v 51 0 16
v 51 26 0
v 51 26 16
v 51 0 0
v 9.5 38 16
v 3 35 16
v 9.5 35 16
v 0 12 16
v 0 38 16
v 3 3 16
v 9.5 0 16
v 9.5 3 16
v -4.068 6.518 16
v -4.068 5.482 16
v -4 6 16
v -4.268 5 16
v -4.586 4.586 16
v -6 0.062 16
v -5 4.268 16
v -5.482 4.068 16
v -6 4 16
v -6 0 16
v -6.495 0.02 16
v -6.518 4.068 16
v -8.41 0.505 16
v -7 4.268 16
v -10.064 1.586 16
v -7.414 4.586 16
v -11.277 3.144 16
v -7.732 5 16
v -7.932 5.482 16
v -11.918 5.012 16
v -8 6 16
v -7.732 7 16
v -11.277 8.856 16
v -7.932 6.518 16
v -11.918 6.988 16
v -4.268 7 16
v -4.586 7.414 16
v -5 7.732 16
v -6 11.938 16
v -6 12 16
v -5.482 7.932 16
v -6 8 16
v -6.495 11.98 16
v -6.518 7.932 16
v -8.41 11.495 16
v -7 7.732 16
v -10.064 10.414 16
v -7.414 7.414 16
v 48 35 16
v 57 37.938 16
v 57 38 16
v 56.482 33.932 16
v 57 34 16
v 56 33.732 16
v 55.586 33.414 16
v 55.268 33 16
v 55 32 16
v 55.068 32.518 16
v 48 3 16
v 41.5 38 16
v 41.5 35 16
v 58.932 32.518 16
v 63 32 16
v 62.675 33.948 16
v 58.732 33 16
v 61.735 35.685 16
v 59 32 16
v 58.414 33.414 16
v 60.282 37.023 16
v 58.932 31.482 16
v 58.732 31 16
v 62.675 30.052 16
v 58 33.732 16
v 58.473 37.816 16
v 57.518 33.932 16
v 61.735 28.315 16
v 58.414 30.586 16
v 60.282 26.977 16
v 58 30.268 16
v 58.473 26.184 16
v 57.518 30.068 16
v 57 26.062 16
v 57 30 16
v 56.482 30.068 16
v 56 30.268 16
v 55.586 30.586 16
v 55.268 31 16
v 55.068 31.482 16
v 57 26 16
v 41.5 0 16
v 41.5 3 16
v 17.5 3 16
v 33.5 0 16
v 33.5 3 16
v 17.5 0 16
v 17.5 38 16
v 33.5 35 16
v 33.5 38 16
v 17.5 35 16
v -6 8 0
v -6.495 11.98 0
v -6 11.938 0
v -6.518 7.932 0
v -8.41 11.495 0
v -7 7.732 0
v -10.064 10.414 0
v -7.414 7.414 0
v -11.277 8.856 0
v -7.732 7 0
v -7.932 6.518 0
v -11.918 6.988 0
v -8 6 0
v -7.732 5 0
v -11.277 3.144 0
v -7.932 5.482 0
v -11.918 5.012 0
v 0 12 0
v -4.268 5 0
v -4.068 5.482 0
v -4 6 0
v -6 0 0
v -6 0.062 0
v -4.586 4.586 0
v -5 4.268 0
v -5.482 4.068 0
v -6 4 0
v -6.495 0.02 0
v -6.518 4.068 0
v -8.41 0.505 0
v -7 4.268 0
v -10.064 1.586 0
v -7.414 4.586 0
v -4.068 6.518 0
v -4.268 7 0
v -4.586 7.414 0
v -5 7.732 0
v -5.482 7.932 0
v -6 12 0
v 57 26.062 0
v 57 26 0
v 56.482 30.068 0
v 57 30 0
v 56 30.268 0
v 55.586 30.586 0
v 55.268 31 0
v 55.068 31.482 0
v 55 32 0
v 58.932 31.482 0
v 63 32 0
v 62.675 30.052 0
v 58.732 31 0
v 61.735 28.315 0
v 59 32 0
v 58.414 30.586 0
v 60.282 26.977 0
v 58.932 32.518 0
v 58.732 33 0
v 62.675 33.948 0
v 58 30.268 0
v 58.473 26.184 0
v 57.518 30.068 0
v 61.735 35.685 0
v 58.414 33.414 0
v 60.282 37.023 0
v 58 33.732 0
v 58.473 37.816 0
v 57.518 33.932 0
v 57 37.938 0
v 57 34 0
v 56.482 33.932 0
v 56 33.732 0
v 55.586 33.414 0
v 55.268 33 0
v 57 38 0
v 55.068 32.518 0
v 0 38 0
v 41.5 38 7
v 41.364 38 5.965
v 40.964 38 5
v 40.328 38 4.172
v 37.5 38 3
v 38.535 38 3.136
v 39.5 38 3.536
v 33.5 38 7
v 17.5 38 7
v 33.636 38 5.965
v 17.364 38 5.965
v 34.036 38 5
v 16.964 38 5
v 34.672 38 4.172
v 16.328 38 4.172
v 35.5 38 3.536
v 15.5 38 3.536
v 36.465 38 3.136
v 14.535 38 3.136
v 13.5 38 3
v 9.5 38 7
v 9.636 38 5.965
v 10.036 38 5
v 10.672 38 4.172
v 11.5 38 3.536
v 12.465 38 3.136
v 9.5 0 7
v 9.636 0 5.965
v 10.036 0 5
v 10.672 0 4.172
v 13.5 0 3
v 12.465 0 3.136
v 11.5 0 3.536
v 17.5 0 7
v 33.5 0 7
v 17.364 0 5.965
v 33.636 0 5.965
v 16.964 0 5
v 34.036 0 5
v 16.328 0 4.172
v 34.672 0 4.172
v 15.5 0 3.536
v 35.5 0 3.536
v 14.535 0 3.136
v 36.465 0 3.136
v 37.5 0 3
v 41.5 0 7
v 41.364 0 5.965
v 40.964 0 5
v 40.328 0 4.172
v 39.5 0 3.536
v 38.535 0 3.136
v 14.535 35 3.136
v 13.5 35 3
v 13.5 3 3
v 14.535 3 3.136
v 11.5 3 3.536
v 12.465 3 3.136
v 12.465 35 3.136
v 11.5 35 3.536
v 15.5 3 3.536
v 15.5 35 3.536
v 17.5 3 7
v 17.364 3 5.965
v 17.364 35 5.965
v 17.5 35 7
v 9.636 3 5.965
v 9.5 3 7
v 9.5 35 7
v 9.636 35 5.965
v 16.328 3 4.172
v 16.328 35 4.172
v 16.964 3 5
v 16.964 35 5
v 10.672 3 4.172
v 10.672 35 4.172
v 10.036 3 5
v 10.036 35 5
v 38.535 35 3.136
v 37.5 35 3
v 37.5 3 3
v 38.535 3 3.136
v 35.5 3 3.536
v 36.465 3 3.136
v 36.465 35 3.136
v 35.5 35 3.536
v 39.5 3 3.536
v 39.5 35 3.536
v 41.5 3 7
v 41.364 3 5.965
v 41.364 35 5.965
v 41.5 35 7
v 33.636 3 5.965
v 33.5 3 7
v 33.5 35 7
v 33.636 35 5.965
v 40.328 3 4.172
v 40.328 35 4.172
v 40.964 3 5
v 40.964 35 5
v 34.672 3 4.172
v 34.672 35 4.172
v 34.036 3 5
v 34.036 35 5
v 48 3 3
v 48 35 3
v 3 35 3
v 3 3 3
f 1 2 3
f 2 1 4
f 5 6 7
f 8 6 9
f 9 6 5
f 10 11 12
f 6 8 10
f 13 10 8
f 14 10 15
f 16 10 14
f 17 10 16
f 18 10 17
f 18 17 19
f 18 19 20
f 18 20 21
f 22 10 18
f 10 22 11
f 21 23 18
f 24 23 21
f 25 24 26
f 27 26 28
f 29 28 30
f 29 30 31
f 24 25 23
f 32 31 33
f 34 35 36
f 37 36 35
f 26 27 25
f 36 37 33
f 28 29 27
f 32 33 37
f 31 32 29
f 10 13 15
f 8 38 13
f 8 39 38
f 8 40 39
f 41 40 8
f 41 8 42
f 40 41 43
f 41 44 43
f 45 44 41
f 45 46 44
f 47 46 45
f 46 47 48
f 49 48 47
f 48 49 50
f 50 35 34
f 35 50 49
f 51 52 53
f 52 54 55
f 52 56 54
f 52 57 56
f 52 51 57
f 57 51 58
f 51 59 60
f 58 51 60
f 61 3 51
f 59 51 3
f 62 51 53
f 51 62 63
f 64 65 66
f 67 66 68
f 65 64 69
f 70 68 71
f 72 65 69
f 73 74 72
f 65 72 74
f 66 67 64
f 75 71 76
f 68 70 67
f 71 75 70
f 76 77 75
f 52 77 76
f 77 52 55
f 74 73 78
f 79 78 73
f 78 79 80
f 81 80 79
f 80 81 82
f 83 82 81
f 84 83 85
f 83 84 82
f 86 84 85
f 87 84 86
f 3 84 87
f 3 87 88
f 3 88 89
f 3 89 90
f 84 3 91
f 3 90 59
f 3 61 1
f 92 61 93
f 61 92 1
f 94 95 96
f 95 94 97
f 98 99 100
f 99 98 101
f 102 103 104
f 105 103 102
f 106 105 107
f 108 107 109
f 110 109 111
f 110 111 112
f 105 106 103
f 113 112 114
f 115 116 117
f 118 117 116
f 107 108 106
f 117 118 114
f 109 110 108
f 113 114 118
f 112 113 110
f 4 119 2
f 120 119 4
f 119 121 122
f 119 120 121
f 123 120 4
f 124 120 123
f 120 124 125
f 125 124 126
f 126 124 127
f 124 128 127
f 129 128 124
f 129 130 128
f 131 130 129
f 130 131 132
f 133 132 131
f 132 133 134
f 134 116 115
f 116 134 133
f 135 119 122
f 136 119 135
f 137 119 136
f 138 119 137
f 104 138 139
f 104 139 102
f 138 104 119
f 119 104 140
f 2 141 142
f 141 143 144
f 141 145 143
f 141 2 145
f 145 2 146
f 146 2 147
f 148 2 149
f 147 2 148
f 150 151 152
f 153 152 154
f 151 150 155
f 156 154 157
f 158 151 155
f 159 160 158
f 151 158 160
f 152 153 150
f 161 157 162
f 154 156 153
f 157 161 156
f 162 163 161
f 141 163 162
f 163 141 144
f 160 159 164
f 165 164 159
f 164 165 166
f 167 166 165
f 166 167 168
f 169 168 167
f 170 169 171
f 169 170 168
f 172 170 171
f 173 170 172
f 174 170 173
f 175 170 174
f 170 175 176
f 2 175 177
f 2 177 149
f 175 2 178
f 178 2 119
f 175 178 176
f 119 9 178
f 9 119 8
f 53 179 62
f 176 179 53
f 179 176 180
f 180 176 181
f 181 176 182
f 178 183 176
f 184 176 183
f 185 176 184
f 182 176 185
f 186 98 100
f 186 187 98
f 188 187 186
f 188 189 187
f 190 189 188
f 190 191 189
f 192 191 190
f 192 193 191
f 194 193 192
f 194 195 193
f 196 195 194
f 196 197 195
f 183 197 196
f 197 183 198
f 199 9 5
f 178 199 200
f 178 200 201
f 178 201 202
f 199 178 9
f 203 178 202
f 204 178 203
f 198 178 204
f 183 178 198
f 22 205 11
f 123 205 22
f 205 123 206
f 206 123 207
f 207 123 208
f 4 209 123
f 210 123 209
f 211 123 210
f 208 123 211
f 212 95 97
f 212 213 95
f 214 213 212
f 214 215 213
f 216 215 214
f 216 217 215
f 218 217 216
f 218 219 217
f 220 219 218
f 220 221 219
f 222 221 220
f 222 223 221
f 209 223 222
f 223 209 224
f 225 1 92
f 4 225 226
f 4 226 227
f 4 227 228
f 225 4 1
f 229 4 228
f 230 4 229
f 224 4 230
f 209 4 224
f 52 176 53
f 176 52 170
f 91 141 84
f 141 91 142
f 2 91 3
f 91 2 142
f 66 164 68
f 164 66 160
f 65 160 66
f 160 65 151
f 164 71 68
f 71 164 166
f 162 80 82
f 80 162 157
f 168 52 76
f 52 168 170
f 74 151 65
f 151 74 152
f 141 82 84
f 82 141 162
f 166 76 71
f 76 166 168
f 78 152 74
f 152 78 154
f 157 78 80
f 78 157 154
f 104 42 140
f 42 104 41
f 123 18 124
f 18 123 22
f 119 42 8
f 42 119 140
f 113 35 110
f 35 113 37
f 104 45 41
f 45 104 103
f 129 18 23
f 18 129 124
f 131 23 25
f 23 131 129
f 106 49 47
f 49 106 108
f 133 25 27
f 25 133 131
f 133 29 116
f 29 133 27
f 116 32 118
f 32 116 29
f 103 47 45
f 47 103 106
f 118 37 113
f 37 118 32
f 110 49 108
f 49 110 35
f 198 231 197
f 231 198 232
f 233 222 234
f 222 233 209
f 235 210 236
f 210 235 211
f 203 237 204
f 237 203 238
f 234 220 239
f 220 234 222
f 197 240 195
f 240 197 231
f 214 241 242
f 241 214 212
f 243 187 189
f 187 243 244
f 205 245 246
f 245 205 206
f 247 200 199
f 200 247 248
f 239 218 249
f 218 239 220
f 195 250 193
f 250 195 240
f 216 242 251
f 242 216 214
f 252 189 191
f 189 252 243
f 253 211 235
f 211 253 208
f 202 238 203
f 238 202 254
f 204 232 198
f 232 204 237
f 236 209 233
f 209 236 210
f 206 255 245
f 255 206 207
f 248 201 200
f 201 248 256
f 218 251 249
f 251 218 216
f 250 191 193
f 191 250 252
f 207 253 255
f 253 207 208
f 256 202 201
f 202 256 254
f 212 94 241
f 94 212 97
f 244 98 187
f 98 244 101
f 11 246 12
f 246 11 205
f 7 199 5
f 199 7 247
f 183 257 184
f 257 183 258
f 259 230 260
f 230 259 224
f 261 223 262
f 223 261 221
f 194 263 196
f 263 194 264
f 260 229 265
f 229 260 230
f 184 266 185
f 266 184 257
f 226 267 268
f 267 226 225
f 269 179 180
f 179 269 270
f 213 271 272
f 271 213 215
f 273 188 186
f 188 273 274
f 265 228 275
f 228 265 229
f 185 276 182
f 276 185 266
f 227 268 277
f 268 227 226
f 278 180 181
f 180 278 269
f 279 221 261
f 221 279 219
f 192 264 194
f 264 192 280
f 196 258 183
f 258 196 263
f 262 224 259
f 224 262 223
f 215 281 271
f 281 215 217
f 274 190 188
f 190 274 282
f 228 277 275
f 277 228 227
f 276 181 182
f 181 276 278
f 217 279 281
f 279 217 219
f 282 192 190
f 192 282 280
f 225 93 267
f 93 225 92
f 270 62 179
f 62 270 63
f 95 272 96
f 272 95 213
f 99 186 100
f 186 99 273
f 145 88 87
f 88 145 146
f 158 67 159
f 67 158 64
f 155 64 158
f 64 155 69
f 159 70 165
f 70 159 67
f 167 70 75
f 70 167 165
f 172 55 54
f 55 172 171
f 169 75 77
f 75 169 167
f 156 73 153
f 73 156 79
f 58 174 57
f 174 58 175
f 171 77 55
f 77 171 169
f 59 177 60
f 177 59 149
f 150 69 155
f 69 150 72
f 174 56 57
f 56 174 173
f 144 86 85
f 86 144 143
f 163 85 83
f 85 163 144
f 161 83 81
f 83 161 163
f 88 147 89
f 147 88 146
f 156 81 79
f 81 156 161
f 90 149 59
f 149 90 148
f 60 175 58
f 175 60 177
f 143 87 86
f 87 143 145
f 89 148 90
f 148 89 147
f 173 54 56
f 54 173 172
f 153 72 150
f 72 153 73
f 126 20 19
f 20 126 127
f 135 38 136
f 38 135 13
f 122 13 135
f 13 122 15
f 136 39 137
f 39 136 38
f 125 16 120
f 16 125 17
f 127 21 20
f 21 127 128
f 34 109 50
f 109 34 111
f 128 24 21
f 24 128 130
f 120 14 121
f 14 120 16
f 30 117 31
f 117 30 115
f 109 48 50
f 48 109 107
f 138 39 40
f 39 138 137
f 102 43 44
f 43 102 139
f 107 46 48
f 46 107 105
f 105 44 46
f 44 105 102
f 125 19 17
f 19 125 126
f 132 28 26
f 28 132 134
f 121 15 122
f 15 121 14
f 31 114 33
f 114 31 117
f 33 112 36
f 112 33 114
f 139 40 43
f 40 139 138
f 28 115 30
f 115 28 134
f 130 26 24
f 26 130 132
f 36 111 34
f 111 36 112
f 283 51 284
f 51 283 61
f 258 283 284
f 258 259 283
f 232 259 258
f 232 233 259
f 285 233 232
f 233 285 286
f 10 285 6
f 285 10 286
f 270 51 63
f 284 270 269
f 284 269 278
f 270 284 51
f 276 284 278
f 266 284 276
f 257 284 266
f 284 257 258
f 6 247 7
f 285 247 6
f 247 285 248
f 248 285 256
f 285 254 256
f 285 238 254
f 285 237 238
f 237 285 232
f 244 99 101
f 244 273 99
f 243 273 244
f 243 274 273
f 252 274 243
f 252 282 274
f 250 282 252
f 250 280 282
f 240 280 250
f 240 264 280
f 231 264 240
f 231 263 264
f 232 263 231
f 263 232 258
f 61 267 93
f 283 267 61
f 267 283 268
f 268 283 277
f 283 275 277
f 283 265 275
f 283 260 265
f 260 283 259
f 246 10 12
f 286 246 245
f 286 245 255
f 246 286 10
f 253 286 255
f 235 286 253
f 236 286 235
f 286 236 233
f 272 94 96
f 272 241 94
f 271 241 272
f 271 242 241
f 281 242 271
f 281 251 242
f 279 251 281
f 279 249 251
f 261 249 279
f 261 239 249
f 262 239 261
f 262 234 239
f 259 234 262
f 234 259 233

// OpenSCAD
// number of relay insets
relays = 2;

// dimensions of relay body
relay_x = 21;
relay_y = 32;
relay_z = 19;

// inset of terminals from body end, edge to center
terminal_offset = 7.5;

// thickness of side, top, divider walls
wall_thickness = 3;

// cover height
cover_height = 16;

// terminal holes
// set to "rect" and set x,y, or set to "round" and set diameter d
// logic checks for "rect" and sets to round for anything else
// ignores irrelevant value set
bottom_hole = "round";
bottom_hole_x = 12;
bottom_hole_y = 9;
bottom_hole_d = 12;

top_hole = "rect";
top_hole_x = 12;
top_hole_y = 9;
top_hole_d = 12;

// mounting tabs width
mounting_tab_width = 12;
// screw hole diameters
mounting_screw_diameter = 4;
cover_screw_diameter = 3;

// uncomment the part you want to render
//baseplate();
//holder();
cover();

overall_x = relays * relay_x + wall_thickness*(relays+1);
overall_y = relay_y+2*wall_thickness;
overall_z = relay_z+wall_thickness;

module cover() {
rotate([0,0,0]) {
    difference() {
    union() {
        // main body
        cube([overall_x,overall_y,cover_height]);
        
        //cover tabs
        translate([overall_x-mounting_tab_width/2,overall_y-mounting_tab_width,0])
        cube([mounting_tab_width,mounting_tab_width,cover_height]);
        translate([overall_x+mounting_tab_width/2,overall_y-mounting_tab_width/2,0])
        cylinder(d=mounting_tab_width,h=cover_height);
        
        translate([-mounting_tab_width/2,0,0])
        cube([mounting_tab_width,mounting_tab_width,cover_height]);
        translate([-mounting_tab_width/2,mounting_tab_width/2,0])
        cylinder(d=mounting_tab_width,h=cover_height);
    }
    
    // cover holes
    // bumped out 1mm in diameter to accommodate top of screw
    translate([overall_x+mounting_tab_width/2,overall_y-mounting_tab_width/2,-1])
    cylinder(d=cover_screw_diameter+1,h=cover_height+2,$fn=24);
    translate([-mounting_tab_width/2,mounting_tab_width/2,-1])
    cylinder(d=cover_screw_diameter+1,h=cover_height+2,$fn=24);
    
    
    // main cavity
    translate([wall_thickness,wall_thickness,wall_thickness])
    cube([overall_x-2*wall_thickness,overall_y-2*wall_thickness,cover_height]);
    
    //wire pass-throughs
    for (i=[0:1:relays-1]) {
        // calculate offsets
        x_offset = i*(relay_x+wall_thickness)+wall_thickness;
        centerline = x_offset+relay_x/2;
        
        translate([centerline,overall_y+1,wall_thickness+4])
        rotate([90,0,0])
        cylinder(d=8,h=overall_y+2,$fn=24);
        
        translate([centerline-4,-1,wall_thickness+4])
        cube([8,overall_y+2,cover_height]);
        
        
        
    }
    
}
}
}



module holder() {
rotate([180,0,0]) {
    difference() {
    union() {
        // main body
        cube([overall_x,overall_y,overall_z]);
        // mounting tabs
        translate([-mounting_tab_width/2,0,0])
        cube([mounting_tab_width,mounting_tab_width,overall_z]);
        translate([-mounting_tab_width/2,mounting_tab_width/2,0])
        cylinder(d=mounting_tab_width,h=overall_z);
        translate([overall_x-mounting_tab_width/2,overall_y-mounting_tab_width,0])
        cube([mounting_tab_width,mounting_tab_width,overall_z]);
        translate([overall_x+mounting_tab_width/2,overall_y-mounting_tab_width/2,0])
        cylinder(d=mounting_tab_width,h=overall_z);
        
        //cover tabs
        translate([overall_x-mounting_tab_width/2,0,overall_z-10])
        cube([mounting_tab_width,mounting_tab_width,10]);
        translate([overall_x+mounting_tab_width/2,mounting_tab_width/2,overall_z-10])
        cylinder(d=mounting_tab_width,h=10);
        translate([-mounting_tab_width/2,overall_y-mounting_tab_width,overall_z-10])
        cube([mounting_tab_width,mounting_tab_width,10]);
        translate([-mounting_tab_width/2,overall_y-mounting_tab_width/2,overall_z-10])
        cylinder(d=mounting_tab_width,h=10);
    }
    //mounting holes
    translate([-mounting_tab_width/2,mounting_tab_width/2,-1])
    cylinder(d=mounting_screw_diameter,h=overall_z+2,$fn=24);
    translate([overall_x+mounting_tab_width/2,overall_y-mounting_tab_width/2,-1])
    cylinder(d=mounting_screw_diameter,h=overall_z+2,$fn=24);
    
    // cover holes
    translate([overall_x+mounting_tab_width/2,mounting_tab_width/2,-1])
    cylinder(d=cover_screw_diameter,h=overall_z+2,$fn=24);
    translate([-mounting_tab_width/2,overall_y-mounting_tab_width/2,-1])
    cylinder(d=cover_screw_diameter,h=overall_z+2,$fn=24);
    
    
    //relay slots and terminal holes
    for (i=[0:1:relays-1]) {
        // relay body sockets
        x_offset = i*(relay_x+wall_thickness)+wall_thickness;
        centerline = x_offset+relay_x/2;
        translate([x_offset,wall_thickness,-1])
        cube([relay_x,relay_y,relay_z+1]);
        
        // bottom holes
        if (bottom_hole == "rect") {
            translate([centerline-bottom_hole_x/2,wall_thickness + terminal_offset - bottom_hole_y/2,-1])
            cube([bottom_hole_x,bottom_hole_y,overall_z+2]);
        }
        else {
            // assumes round hole
             translate([centerline,wall_thickness + terminal_offset,-1])
            cylinder(d=bottom_hole_d, h=overall_z+2);
        }
        
        // top holes
        if (top_hole == "rect") {
            translate([centerline-top_hole_x/2,overall_y-wall_thickness-terminal_offset-top_hole_y/2,-1])
            cube([top_hole_x,top_hole_y,overall_z+2]);
        }
        else {
            // assumes round hole
             translate([centerline,overall_y-wall_thickness-terminal_offset,-1])
            cylinder(d=top_hole_d, h=overall_z+2);
        }
    }
    
}
}
}


module baseplate() {
difference() {
    union() {
        cube([overall_x,overall_y,wall_thickness]);
        translate([-mounting_tab_width/2,0,0])
        cube([mounting_tab_width,mounting_tab_width,wall_thickness]);
        translate([-mounting_tab_width/2,mounting_tab_width/2,0])
        cylinder(d=mounting_tab_width,h=wall_thickness);
        translate([overall_x-mounting_tab_width/2,overall_y-mounting_tab_width,0])
        cube([mounting_tab_width,mounting_tab_width,wall_thickness]);
        translate([overall_x+mounting_tab_width/2,overall_y-mounting_tab_width/2,0])
        cylinder(d=mounting_tab_width,h=wall_thickness);
    }
    translate([-mounting_tab_width/2,mounting_tab_width/2,-1])
    cylinder(d=mounting_screw_diameter,h=mounting_tab_width/2,$fn=24);
    translate([overall_x+mounting_tab_width/2,overall_y-mounting_tab_width/2,-1])
    cylinder(d=mounting_screw_diameter,h=mounting_tab_width/2,$fn=24);
}
}
